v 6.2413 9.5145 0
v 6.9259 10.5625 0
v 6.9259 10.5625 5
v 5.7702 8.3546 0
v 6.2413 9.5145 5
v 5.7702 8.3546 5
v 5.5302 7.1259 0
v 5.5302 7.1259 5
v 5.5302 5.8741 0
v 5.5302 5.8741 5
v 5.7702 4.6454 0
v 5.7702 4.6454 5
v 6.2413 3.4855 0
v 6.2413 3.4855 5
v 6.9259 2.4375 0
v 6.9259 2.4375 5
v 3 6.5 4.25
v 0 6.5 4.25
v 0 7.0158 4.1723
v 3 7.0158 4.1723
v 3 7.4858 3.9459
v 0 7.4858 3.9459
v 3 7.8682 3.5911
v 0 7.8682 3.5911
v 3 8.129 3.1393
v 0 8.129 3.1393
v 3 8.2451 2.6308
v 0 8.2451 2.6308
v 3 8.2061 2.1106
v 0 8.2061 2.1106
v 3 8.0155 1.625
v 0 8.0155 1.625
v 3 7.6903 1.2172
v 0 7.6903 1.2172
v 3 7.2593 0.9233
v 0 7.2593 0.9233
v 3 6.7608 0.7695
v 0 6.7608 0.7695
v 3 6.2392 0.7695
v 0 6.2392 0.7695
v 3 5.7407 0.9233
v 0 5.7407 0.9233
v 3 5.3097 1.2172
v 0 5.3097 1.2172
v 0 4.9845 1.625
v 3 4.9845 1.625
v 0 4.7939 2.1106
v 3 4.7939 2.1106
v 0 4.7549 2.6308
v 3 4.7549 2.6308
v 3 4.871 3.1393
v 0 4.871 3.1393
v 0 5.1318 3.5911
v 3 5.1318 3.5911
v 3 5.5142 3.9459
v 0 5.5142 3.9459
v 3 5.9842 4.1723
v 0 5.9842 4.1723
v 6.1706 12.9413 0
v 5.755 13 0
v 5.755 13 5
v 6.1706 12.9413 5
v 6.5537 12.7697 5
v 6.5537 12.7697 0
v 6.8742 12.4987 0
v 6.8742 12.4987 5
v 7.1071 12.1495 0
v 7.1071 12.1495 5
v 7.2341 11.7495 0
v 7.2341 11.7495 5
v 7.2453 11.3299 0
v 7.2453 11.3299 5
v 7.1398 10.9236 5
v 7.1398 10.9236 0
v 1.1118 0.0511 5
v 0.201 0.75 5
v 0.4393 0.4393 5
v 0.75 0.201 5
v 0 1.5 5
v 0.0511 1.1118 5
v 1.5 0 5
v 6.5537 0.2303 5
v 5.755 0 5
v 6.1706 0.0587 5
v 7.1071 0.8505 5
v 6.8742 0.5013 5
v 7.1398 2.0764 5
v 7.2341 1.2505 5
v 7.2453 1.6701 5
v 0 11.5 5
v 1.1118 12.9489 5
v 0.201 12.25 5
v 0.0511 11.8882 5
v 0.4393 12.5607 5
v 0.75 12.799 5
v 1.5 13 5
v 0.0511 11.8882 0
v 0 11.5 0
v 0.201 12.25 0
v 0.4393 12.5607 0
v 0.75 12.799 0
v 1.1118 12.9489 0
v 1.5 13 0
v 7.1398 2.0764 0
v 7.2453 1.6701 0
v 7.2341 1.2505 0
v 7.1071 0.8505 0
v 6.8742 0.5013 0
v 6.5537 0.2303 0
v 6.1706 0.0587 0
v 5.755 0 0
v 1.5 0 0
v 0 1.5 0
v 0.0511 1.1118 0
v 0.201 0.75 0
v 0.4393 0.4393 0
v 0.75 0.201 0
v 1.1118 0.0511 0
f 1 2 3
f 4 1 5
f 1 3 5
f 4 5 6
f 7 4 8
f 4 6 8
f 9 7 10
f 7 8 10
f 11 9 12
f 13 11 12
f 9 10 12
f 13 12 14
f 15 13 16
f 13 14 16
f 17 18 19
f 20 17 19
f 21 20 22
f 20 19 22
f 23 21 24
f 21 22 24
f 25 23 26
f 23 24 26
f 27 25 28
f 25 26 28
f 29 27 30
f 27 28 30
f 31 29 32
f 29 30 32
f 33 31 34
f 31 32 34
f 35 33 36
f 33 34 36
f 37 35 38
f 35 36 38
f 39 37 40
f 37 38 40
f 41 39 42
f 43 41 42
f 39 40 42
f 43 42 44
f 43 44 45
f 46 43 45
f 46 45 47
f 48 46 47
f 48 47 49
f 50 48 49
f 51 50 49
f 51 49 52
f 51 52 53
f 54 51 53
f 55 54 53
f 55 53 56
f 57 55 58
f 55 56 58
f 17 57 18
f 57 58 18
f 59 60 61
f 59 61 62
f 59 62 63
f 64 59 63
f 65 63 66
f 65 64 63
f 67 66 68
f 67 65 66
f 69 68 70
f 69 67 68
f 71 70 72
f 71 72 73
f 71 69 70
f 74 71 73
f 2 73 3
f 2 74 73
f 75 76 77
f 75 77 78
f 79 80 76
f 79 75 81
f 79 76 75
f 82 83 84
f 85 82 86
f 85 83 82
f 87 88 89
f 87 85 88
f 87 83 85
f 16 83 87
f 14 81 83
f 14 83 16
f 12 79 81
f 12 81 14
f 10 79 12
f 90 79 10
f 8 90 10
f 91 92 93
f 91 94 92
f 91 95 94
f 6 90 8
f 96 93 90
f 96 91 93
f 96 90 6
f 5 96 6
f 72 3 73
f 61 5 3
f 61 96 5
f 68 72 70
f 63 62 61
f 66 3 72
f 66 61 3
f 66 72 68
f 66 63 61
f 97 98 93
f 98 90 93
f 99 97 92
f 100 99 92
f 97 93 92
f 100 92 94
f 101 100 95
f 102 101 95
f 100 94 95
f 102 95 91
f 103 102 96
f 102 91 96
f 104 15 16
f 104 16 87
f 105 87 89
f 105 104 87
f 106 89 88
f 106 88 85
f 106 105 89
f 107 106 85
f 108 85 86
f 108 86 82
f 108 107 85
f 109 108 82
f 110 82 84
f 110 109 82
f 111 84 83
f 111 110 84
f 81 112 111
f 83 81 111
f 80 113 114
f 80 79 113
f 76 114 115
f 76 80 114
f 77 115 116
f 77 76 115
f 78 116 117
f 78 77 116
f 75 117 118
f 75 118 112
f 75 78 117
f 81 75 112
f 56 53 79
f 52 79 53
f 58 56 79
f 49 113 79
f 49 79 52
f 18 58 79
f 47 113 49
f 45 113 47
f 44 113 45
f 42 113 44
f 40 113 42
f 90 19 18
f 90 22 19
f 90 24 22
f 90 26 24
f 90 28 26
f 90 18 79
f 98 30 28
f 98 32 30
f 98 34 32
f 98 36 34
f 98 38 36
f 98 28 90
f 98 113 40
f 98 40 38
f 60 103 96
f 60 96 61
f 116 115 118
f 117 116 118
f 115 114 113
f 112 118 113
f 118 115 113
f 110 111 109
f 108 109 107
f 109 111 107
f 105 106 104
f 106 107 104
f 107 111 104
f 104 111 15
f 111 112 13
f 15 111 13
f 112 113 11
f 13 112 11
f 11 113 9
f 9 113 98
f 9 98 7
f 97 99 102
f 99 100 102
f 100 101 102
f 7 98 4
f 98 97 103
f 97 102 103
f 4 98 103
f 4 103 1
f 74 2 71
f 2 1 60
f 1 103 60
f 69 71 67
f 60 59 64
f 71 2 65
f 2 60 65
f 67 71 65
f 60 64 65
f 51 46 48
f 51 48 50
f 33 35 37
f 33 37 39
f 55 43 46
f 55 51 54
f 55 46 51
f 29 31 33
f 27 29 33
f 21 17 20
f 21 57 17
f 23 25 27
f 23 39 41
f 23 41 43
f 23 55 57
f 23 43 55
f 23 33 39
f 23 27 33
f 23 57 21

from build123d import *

# Parameters (mm, degrees)
SKETCH1_W           = 12
SKETCH1_H           = 13
BOSS_EXTRUDE1_DEPTH = 5
SKETCH3_R           = 6.5
CUT_EXTRUDE1_DEPTH  = 9
SKETCH4_R           = 1.75
CUT_EXTRUDE2_DEPTH  = 3
FILLET1_START       = -1
FILLET1_DEPTH       = 7
FILLET2_R           = 1.5


with BuildPart() as part:
    # Sketch1 → Boss-Extrude1 (new body)
    with BuildSketch(Plane.XY):
        with Locations((6, 6.5)):
            Rectangle(SKETCH1_W, SKETCH1_H)
    extrude(amount=BOSS_EXTRUDE1_DEPTH)

    # Sketch3 → Cut-Extrude1 (cut)
    with BuildSketch(Plane.XY.offset(5)):
        with Locations((12, 6.5)):
            Circle(SKETCH3_R)
    extrude(amount=-CUT_EXTRUDE1_DEPTH, mode=Mode.SUBTRACT)

    # Sketch4 → Cut-Extrude2 (cut)
    with BuildSketch(Plane.ZY):
        with Locations((2.5, 6.5)):
            Circle(SKETCH4_R)
    extrude(amount=-CUT_EXTRUDE2_DEPTH, mode=Mode.SUBTRACT)

    # Fillet1: read off the stored shape, not the designer's step
    # Fillet1 outline → Fillet1 (cut)
    with BuildSketch(Plane.XY.offset(FILLET1_START)):
        with BuildLine():
            ThreePointArc((5.755002002, 13), (7.10708373, 12.149519053), (6.925939126, 10.5625))
            ThreePointArc((6.925939126, 10.5625), (9.185417438, 12.359020823), (12, 13))
            Line((12, 13), (5.755002002, 13))
        make_face()
        with BuildLine():
            ThreePointArc((6.925939126, 2.4375), (7.10708373, 0.850480947), (5.755002002, 0))
            Line((5.755002002, 0), (12, 0))
            ThreePointArc((12, 0), (9.185417438, 0.640979177), (6.925939126, 2.4375))
        make_face()
    extrude(amount=FILLET1_DEPTH, mode=Mode.SUBTRACT)

    # Fillet2
    fillet2_edges = [part.edges().sort_by_distance(p)[0] for p in [
        (0, 13, 2.5),
        (0, 0, 2.5),
    ]]
    fillet(fillet2_edges, radius=FILLET2_R)


solid = part.part
